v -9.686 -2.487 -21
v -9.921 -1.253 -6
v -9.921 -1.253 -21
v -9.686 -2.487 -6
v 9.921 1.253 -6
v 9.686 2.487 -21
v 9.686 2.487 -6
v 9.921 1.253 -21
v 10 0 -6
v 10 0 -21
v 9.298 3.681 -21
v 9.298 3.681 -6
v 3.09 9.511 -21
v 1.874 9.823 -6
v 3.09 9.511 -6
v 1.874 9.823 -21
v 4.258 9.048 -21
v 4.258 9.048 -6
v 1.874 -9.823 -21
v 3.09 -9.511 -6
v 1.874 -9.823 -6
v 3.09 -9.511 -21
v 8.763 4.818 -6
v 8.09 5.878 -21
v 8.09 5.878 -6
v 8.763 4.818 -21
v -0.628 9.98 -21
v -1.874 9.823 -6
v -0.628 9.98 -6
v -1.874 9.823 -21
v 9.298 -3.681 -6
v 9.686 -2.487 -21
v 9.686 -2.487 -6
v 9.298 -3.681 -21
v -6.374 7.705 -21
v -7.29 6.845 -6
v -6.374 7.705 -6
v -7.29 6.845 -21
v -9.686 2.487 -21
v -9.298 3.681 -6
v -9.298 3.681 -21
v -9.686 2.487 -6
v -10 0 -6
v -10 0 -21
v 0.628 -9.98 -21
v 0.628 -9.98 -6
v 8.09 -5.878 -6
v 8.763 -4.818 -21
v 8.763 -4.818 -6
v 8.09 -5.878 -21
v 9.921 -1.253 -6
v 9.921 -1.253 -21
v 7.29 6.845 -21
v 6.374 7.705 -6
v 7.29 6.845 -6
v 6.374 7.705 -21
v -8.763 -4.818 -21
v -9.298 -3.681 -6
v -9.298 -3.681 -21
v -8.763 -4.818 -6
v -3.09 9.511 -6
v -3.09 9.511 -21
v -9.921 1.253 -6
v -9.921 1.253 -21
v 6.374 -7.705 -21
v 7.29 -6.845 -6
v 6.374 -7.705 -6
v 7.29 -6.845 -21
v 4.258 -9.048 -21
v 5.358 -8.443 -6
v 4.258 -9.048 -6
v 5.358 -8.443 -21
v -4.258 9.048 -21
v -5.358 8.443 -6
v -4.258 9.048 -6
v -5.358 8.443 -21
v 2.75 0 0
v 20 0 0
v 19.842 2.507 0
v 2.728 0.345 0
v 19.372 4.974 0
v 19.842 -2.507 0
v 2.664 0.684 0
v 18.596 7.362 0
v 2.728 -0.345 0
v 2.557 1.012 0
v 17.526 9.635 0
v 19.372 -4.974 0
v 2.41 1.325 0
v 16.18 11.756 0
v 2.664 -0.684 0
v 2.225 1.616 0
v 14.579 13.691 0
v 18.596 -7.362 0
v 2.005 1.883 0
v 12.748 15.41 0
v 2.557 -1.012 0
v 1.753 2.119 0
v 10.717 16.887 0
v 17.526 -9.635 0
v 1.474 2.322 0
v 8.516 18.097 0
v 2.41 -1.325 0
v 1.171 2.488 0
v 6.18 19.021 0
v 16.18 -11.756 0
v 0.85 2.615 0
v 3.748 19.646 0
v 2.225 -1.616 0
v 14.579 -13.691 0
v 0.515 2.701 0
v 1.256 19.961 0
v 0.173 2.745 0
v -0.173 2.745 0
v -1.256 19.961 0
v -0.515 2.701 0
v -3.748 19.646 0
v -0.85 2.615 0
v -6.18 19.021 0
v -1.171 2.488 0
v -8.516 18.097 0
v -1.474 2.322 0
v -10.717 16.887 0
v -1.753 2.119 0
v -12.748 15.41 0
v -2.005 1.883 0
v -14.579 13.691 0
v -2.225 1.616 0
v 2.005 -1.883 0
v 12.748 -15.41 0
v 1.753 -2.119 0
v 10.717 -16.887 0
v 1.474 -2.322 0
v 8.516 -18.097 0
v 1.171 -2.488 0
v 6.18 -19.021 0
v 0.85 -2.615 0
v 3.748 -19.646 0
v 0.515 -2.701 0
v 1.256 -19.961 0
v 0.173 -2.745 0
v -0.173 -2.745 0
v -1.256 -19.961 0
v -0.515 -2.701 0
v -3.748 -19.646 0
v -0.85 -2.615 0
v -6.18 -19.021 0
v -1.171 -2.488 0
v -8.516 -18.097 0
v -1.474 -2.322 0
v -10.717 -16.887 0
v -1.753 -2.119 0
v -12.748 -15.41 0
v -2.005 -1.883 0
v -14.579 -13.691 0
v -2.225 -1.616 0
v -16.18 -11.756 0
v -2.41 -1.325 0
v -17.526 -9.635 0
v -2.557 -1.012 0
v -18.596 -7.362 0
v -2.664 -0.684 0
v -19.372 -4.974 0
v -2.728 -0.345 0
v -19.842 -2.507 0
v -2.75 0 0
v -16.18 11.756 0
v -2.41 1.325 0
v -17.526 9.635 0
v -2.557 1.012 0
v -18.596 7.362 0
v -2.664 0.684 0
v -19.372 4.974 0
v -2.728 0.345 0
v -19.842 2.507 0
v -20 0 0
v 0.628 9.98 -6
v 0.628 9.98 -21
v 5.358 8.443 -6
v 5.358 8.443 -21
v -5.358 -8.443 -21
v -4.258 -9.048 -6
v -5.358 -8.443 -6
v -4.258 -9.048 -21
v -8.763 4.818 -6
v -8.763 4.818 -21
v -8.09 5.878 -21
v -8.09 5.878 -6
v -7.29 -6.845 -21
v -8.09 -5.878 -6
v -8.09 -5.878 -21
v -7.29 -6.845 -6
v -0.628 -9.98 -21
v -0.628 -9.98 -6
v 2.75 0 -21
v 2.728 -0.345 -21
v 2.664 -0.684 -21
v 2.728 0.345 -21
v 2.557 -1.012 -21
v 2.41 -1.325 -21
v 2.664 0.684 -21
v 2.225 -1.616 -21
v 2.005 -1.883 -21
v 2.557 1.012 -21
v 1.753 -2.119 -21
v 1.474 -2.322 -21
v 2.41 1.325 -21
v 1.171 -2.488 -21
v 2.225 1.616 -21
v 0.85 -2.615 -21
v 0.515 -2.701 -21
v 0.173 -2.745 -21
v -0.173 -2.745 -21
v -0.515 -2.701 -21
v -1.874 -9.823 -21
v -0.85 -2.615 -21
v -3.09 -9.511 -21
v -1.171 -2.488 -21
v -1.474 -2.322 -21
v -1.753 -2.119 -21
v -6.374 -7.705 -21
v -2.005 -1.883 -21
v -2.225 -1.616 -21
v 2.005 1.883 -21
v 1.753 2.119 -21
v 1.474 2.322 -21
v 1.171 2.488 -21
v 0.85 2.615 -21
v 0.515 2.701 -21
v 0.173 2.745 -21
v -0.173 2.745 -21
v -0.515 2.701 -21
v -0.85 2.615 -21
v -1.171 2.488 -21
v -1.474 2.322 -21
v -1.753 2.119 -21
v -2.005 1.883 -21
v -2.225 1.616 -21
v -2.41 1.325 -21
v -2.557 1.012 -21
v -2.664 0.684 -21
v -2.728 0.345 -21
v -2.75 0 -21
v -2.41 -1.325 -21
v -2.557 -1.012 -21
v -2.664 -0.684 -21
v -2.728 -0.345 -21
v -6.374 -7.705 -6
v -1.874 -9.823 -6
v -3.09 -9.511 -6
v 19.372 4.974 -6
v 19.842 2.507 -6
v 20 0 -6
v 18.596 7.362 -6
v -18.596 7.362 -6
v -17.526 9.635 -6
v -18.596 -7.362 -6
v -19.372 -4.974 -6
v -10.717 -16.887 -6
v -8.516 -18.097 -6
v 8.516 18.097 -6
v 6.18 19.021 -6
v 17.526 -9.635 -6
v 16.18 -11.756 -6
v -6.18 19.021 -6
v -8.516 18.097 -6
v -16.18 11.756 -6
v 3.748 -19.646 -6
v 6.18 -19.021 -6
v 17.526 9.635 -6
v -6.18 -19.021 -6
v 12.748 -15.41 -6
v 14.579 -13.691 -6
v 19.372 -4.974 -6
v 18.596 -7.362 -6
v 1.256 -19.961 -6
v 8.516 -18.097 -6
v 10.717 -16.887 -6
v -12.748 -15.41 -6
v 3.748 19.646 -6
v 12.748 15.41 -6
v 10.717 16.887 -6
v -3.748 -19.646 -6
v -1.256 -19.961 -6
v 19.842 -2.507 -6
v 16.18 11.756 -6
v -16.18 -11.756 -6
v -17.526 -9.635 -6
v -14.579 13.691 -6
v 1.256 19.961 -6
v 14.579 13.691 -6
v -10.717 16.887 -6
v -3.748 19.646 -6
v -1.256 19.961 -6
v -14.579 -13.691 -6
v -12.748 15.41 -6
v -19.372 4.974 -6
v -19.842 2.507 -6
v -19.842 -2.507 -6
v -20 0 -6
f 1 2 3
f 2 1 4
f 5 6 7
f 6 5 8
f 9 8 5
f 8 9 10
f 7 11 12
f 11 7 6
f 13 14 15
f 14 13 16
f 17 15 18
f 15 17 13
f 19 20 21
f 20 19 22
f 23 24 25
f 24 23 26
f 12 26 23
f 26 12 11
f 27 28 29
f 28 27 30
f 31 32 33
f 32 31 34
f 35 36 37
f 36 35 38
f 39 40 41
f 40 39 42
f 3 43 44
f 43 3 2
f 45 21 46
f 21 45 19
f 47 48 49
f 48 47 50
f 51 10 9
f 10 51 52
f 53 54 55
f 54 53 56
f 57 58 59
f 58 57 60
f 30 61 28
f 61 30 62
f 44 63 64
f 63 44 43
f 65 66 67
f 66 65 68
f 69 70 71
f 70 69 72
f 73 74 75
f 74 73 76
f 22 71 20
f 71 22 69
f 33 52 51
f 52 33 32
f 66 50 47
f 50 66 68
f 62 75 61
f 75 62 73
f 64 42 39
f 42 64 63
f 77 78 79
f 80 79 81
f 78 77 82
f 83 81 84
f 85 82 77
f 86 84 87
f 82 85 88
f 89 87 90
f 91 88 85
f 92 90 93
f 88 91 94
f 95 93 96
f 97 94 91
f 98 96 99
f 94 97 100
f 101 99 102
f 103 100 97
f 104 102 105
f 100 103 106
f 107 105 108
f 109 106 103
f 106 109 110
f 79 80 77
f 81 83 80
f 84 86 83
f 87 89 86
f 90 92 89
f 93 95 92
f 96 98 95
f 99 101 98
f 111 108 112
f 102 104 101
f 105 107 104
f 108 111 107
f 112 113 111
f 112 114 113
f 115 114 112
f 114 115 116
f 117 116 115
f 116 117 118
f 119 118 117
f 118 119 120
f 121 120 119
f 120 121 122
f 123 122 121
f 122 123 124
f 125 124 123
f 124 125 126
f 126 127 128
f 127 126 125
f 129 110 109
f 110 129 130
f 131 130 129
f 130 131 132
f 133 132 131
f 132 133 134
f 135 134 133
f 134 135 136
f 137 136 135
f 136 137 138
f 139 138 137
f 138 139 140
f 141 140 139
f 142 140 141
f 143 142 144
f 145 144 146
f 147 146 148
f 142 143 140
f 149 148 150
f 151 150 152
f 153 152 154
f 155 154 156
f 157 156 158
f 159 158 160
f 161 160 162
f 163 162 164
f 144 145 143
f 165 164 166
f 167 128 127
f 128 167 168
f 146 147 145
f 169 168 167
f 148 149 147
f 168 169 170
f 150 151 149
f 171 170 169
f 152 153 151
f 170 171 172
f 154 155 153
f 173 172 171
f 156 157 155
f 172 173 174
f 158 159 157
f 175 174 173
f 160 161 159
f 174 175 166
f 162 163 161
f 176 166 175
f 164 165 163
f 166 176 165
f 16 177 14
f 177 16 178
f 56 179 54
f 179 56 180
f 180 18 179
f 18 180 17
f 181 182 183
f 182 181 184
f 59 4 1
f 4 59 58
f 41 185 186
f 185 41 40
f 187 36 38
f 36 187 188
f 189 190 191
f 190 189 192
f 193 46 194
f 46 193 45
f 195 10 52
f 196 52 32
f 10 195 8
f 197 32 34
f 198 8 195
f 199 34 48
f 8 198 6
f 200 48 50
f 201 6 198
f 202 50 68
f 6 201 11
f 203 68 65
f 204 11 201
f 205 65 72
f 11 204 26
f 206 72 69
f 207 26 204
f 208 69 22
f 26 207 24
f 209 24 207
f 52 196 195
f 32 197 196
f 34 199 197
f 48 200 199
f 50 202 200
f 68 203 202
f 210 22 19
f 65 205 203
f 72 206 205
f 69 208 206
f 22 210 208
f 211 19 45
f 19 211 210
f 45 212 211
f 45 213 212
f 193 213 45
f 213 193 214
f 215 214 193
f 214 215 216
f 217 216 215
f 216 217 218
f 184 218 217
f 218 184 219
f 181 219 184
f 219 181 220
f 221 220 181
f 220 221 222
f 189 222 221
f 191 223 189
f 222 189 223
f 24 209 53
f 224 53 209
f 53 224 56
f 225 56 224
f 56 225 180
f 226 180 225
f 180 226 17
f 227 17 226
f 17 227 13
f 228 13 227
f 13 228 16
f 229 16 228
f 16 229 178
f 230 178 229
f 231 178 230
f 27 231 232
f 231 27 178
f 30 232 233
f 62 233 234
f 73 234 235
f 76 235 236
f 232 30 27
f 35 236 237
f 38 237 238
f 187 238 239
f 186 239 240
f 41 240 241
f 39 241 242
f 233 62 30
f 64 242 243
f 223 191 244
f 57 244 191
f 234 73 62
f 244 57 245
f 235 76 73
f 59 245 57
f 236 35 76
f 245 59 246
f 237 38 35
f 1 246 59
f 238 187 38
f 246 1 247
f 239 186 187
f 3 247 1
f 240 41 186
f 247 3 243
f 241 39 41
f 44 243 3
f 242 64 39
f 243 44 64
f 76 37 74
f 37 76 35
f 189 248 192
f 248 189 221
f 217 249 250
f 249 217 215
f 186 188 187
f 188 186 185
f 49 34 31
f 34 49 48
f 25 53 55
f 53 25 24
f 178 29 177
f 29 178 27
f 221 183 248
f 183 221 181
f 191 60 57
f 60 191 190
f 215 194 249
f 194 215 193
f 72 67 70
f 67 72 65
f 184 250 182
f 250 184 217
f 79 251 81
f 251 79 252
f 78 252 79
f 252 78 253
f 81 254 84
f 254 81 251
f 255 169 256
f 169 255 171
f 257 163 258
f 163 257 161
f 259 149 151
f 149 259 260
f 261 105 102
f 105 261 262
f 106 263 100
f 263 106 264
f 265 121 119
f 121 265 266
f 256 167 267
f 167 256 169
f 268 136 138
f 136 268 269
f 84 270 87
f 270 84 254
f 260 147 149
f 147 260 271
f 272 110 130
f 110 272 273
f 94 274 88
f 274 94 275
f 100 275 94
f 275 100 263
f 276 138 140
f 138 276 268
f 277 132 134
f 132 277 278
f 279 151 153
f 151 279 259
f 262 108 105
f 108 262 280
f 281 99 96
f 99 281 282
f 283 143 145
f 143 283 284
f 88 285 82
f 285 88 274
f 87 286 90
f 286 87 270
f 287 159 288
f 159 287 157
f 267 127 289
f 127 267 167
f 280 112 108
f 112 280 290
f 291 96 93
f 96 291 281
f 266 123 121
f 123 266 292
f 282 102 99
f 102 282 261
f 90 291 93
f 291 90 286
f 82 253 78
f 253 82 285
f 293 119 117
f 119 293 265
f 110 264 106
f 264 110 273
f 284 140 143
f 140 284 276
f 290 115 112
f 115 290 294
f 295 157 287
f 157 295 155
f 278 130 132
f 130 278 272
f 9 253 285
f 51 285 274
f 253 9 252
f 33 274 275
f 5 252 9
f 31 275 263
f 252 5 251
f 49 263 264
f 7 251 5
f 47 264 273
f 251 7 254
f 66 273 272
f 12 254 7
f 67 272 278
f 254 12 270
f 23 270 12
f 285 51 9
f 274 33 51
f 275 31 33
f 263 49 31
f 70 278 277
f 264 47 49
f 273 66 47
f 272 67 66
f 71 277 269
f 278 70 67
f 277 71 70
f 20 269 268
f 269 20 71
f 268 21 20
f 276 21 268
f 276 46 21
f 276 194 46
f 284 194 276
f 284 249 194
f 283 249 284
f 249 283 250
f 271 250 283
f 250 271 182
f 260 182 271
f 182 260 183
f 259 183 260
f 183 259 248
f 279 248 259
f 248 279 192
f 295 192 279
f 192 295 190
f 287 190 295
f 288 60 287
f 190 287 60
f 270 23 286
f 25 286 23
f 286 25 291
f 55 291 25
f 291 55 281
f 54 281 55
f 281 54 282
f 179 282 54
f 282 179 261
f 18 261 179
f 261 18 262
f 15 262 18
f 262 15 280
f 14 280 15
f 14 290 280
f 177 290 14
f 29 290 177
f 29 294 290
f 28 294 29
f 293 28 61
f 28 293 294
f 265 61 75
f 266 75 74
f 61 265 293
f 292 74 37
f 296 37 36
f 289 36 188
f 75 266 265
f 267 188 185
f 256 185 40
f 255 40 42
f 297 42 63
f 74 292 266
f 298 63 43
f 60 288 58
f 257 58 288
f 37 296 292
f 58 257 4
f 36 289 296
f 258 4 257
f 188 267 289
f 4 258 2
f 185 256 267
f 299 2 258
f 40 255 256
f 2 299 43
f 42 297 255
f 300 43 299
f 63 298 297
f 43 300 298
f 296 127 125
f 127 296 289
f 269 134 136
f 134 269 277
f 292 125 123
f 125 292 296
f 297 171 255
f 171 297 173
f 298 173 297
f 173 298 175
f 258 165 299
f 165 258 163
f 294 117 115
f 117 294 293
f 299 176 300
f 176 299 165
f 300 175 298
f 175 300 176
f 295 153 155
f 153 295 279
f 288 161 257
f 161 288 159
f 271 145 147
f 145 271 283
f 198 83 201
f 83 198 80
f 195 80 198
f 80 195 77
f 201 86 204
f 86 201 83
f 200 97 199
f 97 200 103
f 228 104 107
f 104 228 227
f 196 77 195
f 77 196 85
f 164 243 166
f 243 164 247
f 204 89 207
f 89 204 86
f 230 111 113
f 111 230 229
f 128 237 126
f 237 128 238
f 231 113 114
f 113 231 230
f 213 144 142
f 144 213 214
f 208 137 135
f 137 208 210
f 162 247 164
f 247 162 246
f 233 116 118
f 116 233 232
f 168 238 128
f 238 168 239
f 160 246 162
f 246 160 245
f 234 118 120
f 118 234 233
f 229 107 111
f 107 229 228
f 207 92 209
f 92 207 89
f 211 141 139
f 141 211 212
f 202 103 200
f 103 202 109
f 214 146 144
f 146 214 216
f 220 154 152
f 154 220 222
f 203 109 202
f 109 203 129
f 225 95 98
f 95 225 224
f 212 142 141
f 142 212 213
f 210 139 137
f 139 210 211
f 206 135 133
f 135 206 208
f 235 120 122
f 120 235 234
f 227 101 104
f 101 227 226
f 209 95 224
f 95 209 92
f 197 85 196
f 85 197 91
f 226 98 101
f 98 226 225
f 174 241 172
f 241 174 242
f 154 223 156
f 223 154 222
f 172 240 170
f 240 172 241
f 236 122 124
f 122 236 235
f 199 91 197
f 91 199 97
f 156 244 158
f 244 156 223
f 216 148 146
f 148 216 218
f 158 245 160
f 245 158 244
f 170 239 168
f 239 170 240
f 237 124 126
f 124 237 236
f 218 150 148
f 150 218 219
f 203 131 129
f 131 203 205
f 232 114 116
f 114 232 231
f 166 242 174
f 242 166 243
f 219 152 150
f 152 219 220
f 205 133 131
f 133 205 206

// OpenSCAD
$fn = 50;


difference() {
	union() {
		translate(v = [0, 0, -21.0000000000]) {
			cylinder(h = 21, r = 10.0000000000);
		}
		translate(v = [0, 0, -6.0000000000]) {
			cylinder(h = 6, r = 20.0000000000);
		}
	}
	union() {
		#translate(v = [0, 0, -21]) {
			cylinder(h = 21, r = 2.7500000000);
		}
	}
}
